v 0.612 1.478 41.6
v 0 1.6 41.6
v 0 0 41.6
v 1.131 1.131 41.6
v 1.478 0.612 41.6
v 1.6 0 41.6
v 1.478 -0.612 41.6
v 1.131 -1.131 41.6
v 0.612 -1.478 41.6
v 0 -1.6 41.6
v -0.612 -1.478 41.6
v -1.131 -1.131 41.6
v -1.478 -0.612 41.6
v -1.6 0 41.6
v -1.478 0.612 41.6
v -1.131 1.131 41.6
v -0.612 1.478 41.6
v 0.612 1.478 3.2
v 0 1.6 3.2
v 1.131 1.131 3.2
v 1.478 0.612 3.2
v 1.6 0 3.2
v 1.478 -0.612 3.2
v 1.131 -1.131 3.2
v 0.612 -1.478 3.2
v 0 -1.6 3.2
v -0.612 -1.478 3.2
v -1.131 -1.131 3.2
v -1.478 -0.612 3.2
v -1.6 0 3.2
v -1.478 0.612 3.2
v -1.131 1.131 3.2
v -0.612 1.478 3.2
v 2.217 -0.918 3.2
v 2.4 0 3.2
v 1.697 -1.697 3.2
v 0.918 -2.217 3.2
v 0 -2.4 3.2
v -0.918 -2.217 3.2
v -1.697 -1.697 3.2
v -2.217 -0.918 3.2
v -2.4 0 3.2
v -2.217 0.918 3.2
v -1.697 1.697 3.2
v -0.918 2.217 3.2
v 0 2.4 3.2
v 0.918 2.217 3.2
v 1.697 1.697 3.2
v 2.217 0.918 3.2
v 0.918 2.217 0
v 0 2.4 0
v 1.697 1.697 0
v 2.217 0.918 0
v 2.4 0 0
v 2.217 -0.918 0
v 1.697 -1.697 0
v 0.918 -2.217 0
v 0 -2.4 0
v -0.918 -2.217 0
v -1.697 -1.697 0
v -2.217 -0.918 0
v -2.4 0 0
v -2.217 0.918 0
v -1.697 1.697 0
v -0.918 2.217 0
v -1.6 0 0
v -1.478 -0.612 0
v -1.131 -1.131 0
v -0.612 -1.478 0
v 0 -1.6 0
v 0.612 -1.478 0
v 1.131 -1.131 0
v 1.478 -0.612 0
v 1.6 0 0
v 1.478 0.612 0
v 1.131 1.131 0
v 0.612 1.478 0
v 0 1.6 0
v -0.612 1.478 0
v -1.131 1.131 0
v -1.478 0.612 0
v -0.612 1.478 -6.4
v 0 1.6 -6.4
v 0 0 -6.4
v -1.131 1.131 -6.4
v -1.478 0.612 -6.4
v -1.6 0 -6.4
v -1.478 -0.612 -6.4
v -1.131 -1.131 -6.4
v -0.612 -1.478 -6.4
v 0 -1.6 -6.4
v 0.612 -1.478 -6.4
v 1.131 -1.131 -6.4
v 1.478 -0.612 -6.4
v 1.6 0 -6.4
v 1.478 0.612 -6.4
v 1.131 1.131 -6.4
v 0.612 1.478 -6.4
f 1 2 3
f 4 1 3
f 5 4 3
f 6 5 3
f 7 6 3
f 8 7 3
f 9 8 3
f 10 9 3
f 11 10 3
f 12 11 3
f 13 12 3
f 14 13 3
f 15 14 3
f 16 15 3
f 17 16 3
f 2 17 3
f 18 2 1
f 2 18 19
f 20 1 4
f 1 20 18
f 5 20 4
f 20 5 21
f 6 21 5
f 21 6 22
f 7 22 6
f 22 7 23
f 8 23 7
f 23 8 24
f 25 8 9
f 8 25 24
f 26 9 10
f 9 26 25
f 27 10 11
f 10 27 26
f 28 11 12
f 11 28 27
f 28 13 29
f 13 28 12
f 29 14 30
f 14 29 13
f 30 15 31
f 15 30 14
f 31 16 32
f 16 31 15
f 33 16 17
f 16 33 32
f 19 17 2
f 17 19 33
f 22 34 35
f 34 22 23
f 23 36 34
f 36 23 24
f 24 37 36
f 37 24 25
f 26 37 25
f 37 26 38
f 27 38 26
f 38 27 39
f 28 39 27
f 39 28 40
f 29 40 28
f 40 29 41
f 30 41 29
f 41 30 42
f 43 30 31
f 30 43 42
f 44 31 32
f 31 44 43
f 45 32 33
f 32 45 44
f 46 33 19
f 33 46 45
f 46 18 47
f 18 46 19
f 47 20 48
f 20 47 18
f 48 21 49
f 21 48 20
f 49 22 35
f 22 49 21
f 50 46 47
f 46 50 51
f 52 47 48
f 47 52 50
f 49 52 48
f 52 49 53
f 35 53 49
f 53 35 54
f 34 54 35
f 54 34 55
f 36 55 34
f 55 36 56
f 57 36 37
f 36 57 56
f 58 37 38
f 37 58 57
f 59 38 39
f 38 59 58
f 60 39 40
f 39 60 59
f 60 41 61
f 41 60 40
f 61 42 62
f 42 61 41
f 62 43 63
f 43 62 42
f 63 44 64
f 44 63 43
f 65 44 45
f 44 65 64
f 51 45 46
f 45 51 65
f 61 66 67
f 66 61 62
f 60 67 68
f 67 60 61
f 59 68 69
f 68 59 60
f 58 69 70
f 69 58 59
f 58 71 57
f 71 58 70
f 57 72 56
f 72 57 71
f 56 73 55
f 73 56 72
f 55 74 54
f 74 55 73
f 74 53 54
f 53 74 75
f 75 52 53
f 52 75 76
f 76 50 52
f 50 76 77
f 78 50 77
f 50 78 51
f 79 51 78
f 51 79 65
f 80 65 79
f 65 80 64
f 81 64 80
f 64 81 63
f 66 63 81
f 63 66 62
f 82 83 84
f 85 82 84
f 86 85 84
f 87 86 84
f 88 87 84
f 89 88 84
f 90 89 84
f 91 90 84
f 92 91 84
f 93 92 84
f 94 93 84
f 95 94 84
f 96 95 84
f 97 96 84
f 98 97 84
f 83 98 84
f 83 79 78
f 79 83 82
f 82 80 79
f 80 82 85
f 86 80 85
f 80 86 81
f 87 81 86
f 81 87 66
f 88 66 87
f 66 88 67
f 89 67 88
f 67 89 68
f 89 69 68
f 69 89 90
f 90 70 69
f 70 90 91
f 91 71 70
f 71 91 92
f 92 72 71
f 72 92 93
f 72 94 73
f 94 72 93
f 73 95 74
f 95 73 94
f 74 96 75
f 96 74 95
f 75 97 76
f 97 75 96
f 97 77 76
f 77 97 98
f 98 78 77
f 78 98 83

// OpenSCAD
// file: ../p/4-4disc.scad
use <../lib.scad>
function ldraw_lib__4_4disc() = [
// 0 Disc 1.0
// 0 Name: 4-4disc.dat
// 0 Author: James Jessiman
// 0 !LDRAW_ORG Primitive UPDATE 2002-02
// 0 !LICENSE Licensed under CC BY 4.0 : see CAreadme.txt
// 
// 0 BFC CERTIFY CCW
  [0,"BFC","CERTIFY"],
  [0,"BFC","CCW"],
// 
// 0 !HISTORY 1998-12-15 [PTadmin] Official Update 1998-10
// 0 !HISTORY 2002-03-23 [sbliss] Added BFC statement
// 0 !HISTORY 2002-04-25 [PTadmin] Official Update 2002-02
// 0 !HISTORY 2007-06-24 [PTadmin] Header formatted for Contributor Agreement
// 0 !HISTORY 2008-07-01 [PTadmin] Official Update 2008-01
// 
// 
// 3 16 0 0 0 1 0 0 0.9239 0 0.3827
  [3,16,0,0,0,1,0,0,0.9239,0,0.3827],
// 3 16 0 0 0 0.9239 0 0.3827 0.7071 0 0.7071
  [3,16,0,0,0,0.9239,0,0.3827,0.7071,0,0.7071],
// 3 16 0 0 0 0.7071 0 0.7071 0.3827 0 0.9239
  [3,16,0,0,0,0.7071,0,0.7071,0.3827,0,0.9239],
// 3 16 0 0 0 0.3827 0 0.9239 0 0 1
  [3,16,0,0,0,0.3827,0,0.9239,0,0,1],
// 3 16 0 0 0 0 0 1 -0.3827 0 0.9239
  [3,16,0,0,0,0,0,1,-0.3827,0,0.9239],
// 3 16 0 0 0 -0.3827 0 0.9239 -0.7071 0 0.7071
  [3,16,0,0,0,-0.3827,0,0.9239,-0.7071,0,0.7071],
// 3 16 0 0 0 -0.7071 0 0.7071 -0.9239 0 0.3827
  [3,16,0,0,0,-0.7071,0,0.7071,-0.9239,0,0.3827],
// 3 16 0 0 0 -0.9239 0 0.3827 -1 0 -0
  [3,16,0,0,0,-0.9239,0,0.3827,-1,0,-0],
// 3 16 0 0 0 -1 0 -0 -0.9239 0 -0.3827
  [3,16,0,0,0,-1,0,-0,-0.9239,0,-0.3827],
// 3 16 0 0 0 -0.9239 0 -0.3827 -0.7071 0 -0.7071
  [3,16,0,0,0,-0.9239,0,-0.3827,-0.7071,0,-0.7071],
// 3 16 0 0 0 -0.7071 0 -0.7071 -0.3827 0 -0.9239
  [3,16,0,0,0,-0.7071,0,-0.7071,-0.3827,0,-0.9239],
// 3 16 0 0 0 -0.3827 0 -0.9239 0 0 -1
  [3,16,0,0,0,-0.3827,0,-0.9239,0,0,-1],
// 3 16 0 0 0 0 0 -1 0.3827 0 -0.9239
  [3,16,0,0,0,0,0,-1,0.3827,0,-0.9239],
// 3 16 0 0 0 0.3827 0 -0.9239 0.7071 0 -0.7071
  [3,16,0,0,0,0.3827,0,-0.9239,0.7071,0,-0.7071],
// 3 16 0 0 0 0.7071 0 -0.7071 0.9239 0 -0.3827
  [3,16,0,0,0,0.7071,0,-0.7071,0.9239,0,-0.3827],
// 3 16 0 0 0 0.9239 0 -0.3827 1 0 0
  [3,16,0,0,0,0.9239,0,-0.3827,1,0,0],
// 0
];
module ldraw_lib__4_4disc(step=0, col=false, unit=2/5, alt=false, line=0.2, solid=!$preview)
    makepoly(ldraw_lib__4_4disc(), step=step, col=col, unit=unit, alt=alt, line=line, solid=solid);
ldraw_lib__4_4disc(line=0.2);
// file: ../p/4-4ring2.scad
use <../lib.scad>
function ldraw_lib__4_4ring2() = [
// 0 Ring  2 x 1.0
// 0 Name: 4-4ring2.dat
// 0 Author: James Jessiman
// 0 !LDRAW_ORG Primitive UPDATE 2009-01
// 0 !LICENSE Licensed under CC BY 4.0 : see CAreadme.txt
// 
// 0 BFC CERTIFY CCW
  [0,"BFC","CERTIFY"],
  [0,"BFC","CCW"],
// 
// 0 !HISTORY 1998-12-15 [PTadmin] Official Update 1998-10
// 0 !HISTORY 2002-04-05 [hafhead] Added BFC statement
// 0 !HISTORY 2002-04-25 [PTadmin] Official Update 2002-02
// 0 !HISTORY 2007-06-24 [PTadmin] Header formatted for Contributor Agreement
// 0 !HISTORY 2008-07-01 [PTadmin] Official Update 2008-01
// 0 !HISTORY 2008-08-26 [cwdee] Switch polygon winding and rename
// 0 !HISTORY 2009-05-02 [PTadmin] Official Update 2009-01
// 
// 
// 4 16 -1.1481 0 2.7717 -0.7654 0 1.8478 0 0 2 0 0 3
  [4,16,-1.1481,0,2.7717,-0.7654,0,1.8478,0,0,2,0,0,3],
// 4 16 -2.1213 0 2.1213 -1.4142 0 1.4142 -0.7654 0 1.8478 -1.1481 0 2.7717
  [4,16,-2.1213,0,2.1213,-1.4142,0,1.4142,-0.7654,0,1.8478,-1.1481,0,2.7717],
// 4 16 -2.7717 0 1.1481 -1.8478 0 0.7654 -1.4142 0 1.4142 -2.1213 0 2.1213
  [4,16,-2.7717,0,1.1481,-1.8478,0,0.7654,-1.4142,0,1.4142,-2.1213,0,2.1213],
// 4 16 -3 0 0 -2 0 0 -1.8478 0 0.7654 -2.7717 0 1.1481
  [4,16,-3,0,0,-2,0,0,-1.8478,0,0.7654,-2.7717,0,1.1481],
// 4 16 -2.7717 0 -1.1481 -1.8478 0 -0.7654 -2 0 0 -3 0 0
  [4,16,-2.7717,0,-1.1481,-1.8478,0,-0.7654,-2,0,0,-3,0,0],
// 4 16 -2.1213 0 -2.1213 -1.4142 0 -1.4142 -1.8478 0 -0.7654 -2.7717 0 -1.1481
  [4,16,-2.1213,0,-2.1213,-1.4142,0,-1.4142,-1.8478,0,-0.7654,-2.7717,0,-1.1481],
// 4 16 -1.1481 0 -2.7717 -0.7654 0 -1.8478 -1.4142 0 -1.4142 -2.1213 0 -2.1213
  [4,16,-1.1481,0,-2.7717,-0.7654,0,-1.8478,-1.4142,0,-1.4142,-2.1213,0,-2.1213],
// 4 16 0 0 -3 0 0 -2 -0.7654 0 -1.8478 -1.1481 0 -2.7717
  [4,16,0,0,-3,0,0,-2,-0.7654,0,-1.8478,-1.1481,0,-2.7717],
// 4 16 1.1481 0 -2.7717 0.7654 0 -1.8478 0 0 -2 0 0 -3
  [4,16,1.1481,0,-2.7717,0.7654,0,-1.8478,0,0,-2,0,0,-3],
// 4 16 2.1213 0 -2.1213 1.4142 0 -1.4142 0.7654 0 -1.8478 1.1481 0 -2.7717
  [4,16,2.1213,0,-2.1213,1.4142,0,-1.4142,0.7654,0,-1.8478,1.1481,0,-2.7717],
// 4 16 2.7717 0 -1.1481 1.8478 0 -0.7654 1.4142 0 -1.4142 2.1213 0 -2.1213
  [4,16,2.7717,0,-1.1481,1.8478,0,-0.7654,1.4142,0,-1.4142,2.1213,0,-2.1213],
// 4 16 3 0 0 2 0 0 1.8478 0 -0.7654 2.7717 0 -1.1481
  [4,16,3,0,0,2,0,0,1.8478,0,-0.7654,2.7717,0,-1.1481],
// 4 16 2.7717 0 1.1481 1.8478 0 0.7654 2 0 0 3 0 0
  [4,16,2.7717,0,1.1481,1.8478,0,0.7654,2,0,0,3,0,0],
// 4 16 2.1213 0 2.1213 1.4142 0 1.4142 1.8478 0 0.7654 2.7717 0 1.1481
  [4,16,2.1213,0,2.1213,1.4142,0,1.4142,1.8478,0,0.7654,2.7717,0,1.1481],
// 4 16 1.1481 0 2.7717 0.7654 0 1.8478 1.4142 0 1.4142 2.1213 0 2.1213
  [4,16,1.1481,0,2.7717,0.7654,0,1.8478,1.4142,0,1.4142,2.1213,0,2.1213],
// 4 16 0 0 3 0 0 2 0.7654 0 1.8478 1.1481 0 2.7717
  [4,16,0,0,3,0,0,2,0.7654,0,1.8478,1.1481,0,2.7717],
// 0
];
module ldraw_lib__4_4ring2(step=0, col=false, unit=2/5, alt=false, line=0.2, solid=!$preview)
    makepoly(ldraw_lib__4_4ring2(), step=step, col=col, unit=unit, alt=alt, line=line, solid=solid);
ldraw_lib__4_4ring2(line=0.2);
// file: ../p/4-4edge.scad
use <../lib.scad>
function ldraw_lib__4_4edge() = [
// 0 Circle 1.0
// 0 Name: 4-4edge.dat
// 0 Author: James Jessiman
// 0 !LDRAW_ORG Primitive UPDATE 2017-01
// 0 !LICENSE Licensed under CC BY 4.0 : see CAreadme.txt
// 
// 0 BFC CERTIFY CCW
  [0,"BFC","CERTIFY"],
  [0,"BFC","CCW"],
// 
// 0 !HISTORY 1998-12-15 [PTadmin] Official Update 1998-10
// 0 !HISTORY 2005-12-28 [PTadmin] Official Update 2005-01
// 0 !HISTORY 2007-06-24 [PTadmin] Header formatted for Contributor Agreement
// 0 !HISTORY 2008-07-01 [PTadmin] Official Update 2008-01
// 0 !HISTORY 2017-01-15 [Steffen] BFCed
// 0 !HISTORY 2017-12-30 [PTadmin] Official Update 2017-01
// 
// 
// 2 24 1 0 0 0.9239 0 0.3827
  [2,24,1,0,0,0.9239,0,0.3827],
// 2 24 0.9239 0 0.3827 0.7071 0 0.7071
  [2,24,0.9239,0,0.3827,0.7071,0,0.7071],
// 2 24 0.7071 0 0.7071 0.3827 0 0.9239
  [2,24,0.7071,0,0.7071,0.3827,0,0.9239],
// 2 24 0.3827 0 0.9239 0 0 1
  [2,24,0.3827,0,0.9239,0,0,1],
// 2 24 0 0 1 -0.3827 0 0.9239
  [2,24,0,0,1,-0.3827,0,0.9239],
// 2 24 -0.3827 0 0.9239 -0.7071 0 0.7071
  [2,24,-0.3827,0,0.9239,-0.7071,0,0.7071],
// 2 24 -0.7071 0 0.7071 -0.9239 0 0.3827
  [2,24,-0.7071,0,0.7071,-0.9239,0,0.3827],
// 2 24 -0.9239 0 0.3827 -1 0 -0
  [2,24,-0.9239,0,0.3827,-1,0,-0],
// 2 24 -1 0 -0 -0.9239 0 -0.3827
  [2,24,-1,0,-0,-0.9239,0,-0.3827],
// 2 24 -0.9239 0 -0.3827 -0.7071 0 -0.7071
  [2,24,-0.9239,0,-0.3827,-0.7071,0,-0.7071],
// 2 24 -0.7071 0 -0.7071 -0.3827 0 -0.9239
  [2,24,-0.7071,0,-0.7071,-0.3827,0,-0.9239],
// 2 24 -0.3827 0 -0.9239 0 0 -1
  [2,24,-0.3827,0,-0.9239,0,0,-1],
// 2 24 0 0 -1 0.3827 0 -0.9239
  [2,24,0,0,-1,0.3827,0,-0.9239],
// 2 24 0.3827 0 -0.9239 0.7071 0 -0.7071
  [2,24,0.3827,0,-0.9239,0.7071,0,-0.7071],
// 2 24 0.7071 0 -0.7071 0.9239 0 -0.3827
  [2,24,0.7071,0,-0.7071,0.9239,0,-0.3827],
// 2 24 0.9239 0 -0.3827 1 0 0
  [2,24,0.9239,0,-0.3827,1,0,0],
];
module ldraw_lib__4_4edge(step=0, col=false, unit=2/5, alt=false, line=0.2, solid=!$preview)
    makepoly(ldraw_lib__4_4edge(), step=step, col=col, unit=unit, alt=alt, line=line, solid=solid);
ldraw_lib__4_4edge(line=0.2);
// file: ../p/4-4cyli.scad
use <../lib.scad>
function ldraw_lib__4_4cyli() = [
// 0 Cylinder 1.0
// 0 Name: 4-4cyli.dat
// 0 Author: James Jessiman
// 0 !LDRAW_ORG Primitive UPDATE 2005-01
// 0 !LICENSE Licensed under CC BY 4.0 : see CAreadme.txt
// 
// 0 BFC CERTIFY CCW
  [0,"BFC","CERTIFY"],
  [0,"BFC","CCW"],
// 
// 0 !HISTORY 1998-12-15 [PTadmin] Official Update 1998-10
// 0 !HISTORY 2002-03-23 [sbliss] Added BFC statement; merged headers from files in distributions LDraw 0.27 and Complete.
// 0 !HISTORY 2002-04-25 [PTadmin] Official Update 2002-02
// 0 !HISTORY 2004-12-14 [guyvivan] BFC CCW
// 0 !HISTORY 2005-12-28 [PTadmin] Official Update 2005-01
// 0 !HISTORY 2007-06-24 [PTadmin] Header formatted for Contributor Agreement
// 0 !HISTORY 2008-07-01 [PTadmin] Official Update 2008-01
// 
// 
// 4 16 1 1 0 0.9239 1 0.3827 0.9239 0 0.3827 1 0 0
  [4,16,1,1,0,0.9239,1,0.3827,0.9239,0,0.3827,1,0,0],
// 5 24 1 0 0 1 1 0 0.9239 0 0.3827 0.9239 0 -0.3827
  [5,24,1,0,0,1,1,0,0.9239,0,0.3827,0.9239,0,-0.3827],
// 4 16 0.9239 1 0.3827 0.7071 1 0.7071 0.7071 0 0.7071 0.9239 0 0.3827
  [4,16,0.9239,1,0.3827,0.7071,1,0.7071,0.7071,0,0.7071,0.9239,0,0.3827],
// 5 24 0.9239 0 0.3827 0.9239 1 0.3827 0.7071 0 0.7071 1 0 0
  [5,24,0.9239,0,0.3827,0.9239,1,0.3827,0.7071,0,0.7071,1,0,0],
// 4 16 0.7071 1 0.7071 0.3827 1 0.9239 0.3827 0 0.9239 0.7071 0 0.7071
  [4,16,0.7071,1,0.7071,0.3827,1,0.9239,0.3827,0,0.9239,0.7071,0,0.7071],
// 5 24 0.7071 0 0.7071 0.7071 1 0.7071 0.3827 0 0.9239 0.9239 0 0.3827
  [5,24,0.7071,0,0.7071,0.7071,1,0.7071,0.3827,0,0.9239,0.9239,0,0.3827],
// 4 16 0.3827 1 0.9239 0 1 1 0 0 1 0.3827 0 0.9239
  [4,16,0.3827,1,0.9239,0,1,1,0,0,1,0.3827,0,0.9239],
// 5 24 0.3827 0 0.9239 0.3827 1 0.9239 0 0 1 0.7071 0 0.7071
  [5,24,0.3827,0,0.9239,0.3827,1,0.9239,0,0,1,0.7071,0,0.7071],
// 4 16 0 1 1 -0.3827 1 0.9239 -0.3827 0 0.9239 0 0 1
  [4,16,0,1,1,-0.3827,1,0.9239,-0.3827,0,0.9239,0,0,1],
// 5 24 0 0 1 0 1 1 -0.3827 0 0.9239 0.3827 0 0.9239
  [5,24,0,0,1,0,1,1,-0.3827,0,0.9239,0.3827,0,0.9239],
// 4 16 -0.3827 1 0.9239 -0.7071 1 0.7071 -0.7071 0 0.7071 -0.3827 0 0.9239
  [4,16,-0.3827,1,0.9239,-0.7071,1,0.7071,-0.7071,0,0.7071,-0.3827,0,0.9239],
// 5 24 -0.3827 0 0.9239 -0.3827 1 0.9239 -0.7071 0 0.7071 0 0 1
  [5,24,-0.3827,0,0.9239,-0.3827,1,0.9239,-0.7071,0,0.7071,0,0,1],
// 4 16 -0.7071 1 0.7071 -0.9239 1 0.3827 -0.9239 0 0.3827 -0.7071 0 0.7071
  [4,16,-0.7071,1,0.7071,-0.9239,1,0.3827,-0.9239,0,0.3827,-0.7071,0,0.7071],
// 5 24 -0.7071 0 0.7071 -0.7071 1 0.7071 -0.9239 0 0.3827 -0.3827 0 0.9239
  [5,24,-0.7071,0,0.7071,-0.7071,1,0.7071,-0.9239,0,0.3827,-0.3827,0,0.9239],
// 4 16 -0.9239 1 0.3827 -1 1 0 -1 0 0 -0.9239 0 0.3827
  [4,16,-0.9239,1,0.3827,-1,1,0,-1,0,0,-0.9239,0,0.3827],
// 5 24 -0.9239 0 0.3827 -0.9239 1 0.3827 -1 0 0 -0.7071 0 0.7071
  [5,24,-0.9239,0,0.3827,-0.9239,1,0.3827,-1,0,0,-0.7071,0,0.7071],
// 4 16 -1 1 0 -0.9239 1 -0.3827 -0.9239 0 -0.3827 -1 0 0
  [4,16,-1,1,0,-0.9239,1,-0.3827,-0.9239,0,-0.3827,-1,0,0],
// 5 24 -1 0 0 -1 1 0 -0.9239 0 -0.3827 -0.9239 0 0.3827
  [5,24,-1,0,0,-1,1,0,-0.9239,0,-0.3827,-0.9239,0,0.3827],
// 4 16 -0.9239 1 -0.3827 -0.7071 1 -0.7071 -0.7071 0 -0.7071 -0.9239 0 -0.3827
  [4,16,-0.9239,1,-0.3827,-0.7071,1,-0.7071,-0.7071,0,-0.7071,-0.9239,0,-0.3827],
// 5 24 -0.9239 0 -0.3827 -0.9239 1 -0.3827 -0.7071 0 -0.7071 -1 0 0
  [5,24,-0.9239,0,-0.3827,-0.9239,1,-0.3827,-0.7071,0,-0.7071,-1,0,0],
// 4 16 -0.7071 1 -0.7071 -0.3827 1 -0.9239 -0.3827 0 -0.9239 -0.7071 0 -0.7071
  [4,16,-0.7071,1,-0.7071,-0.3827,1,-0.9239,-0.3827,0,-0.9239,-0.7071,0,-0.7071],
// 5 24 -0.7071 0 -0.7071 -0.7071 1 -0.7071 -0.3827 0 -0.9239 -0.9239 0 -0.3827
  [5,24,-0.7071,0,-0.7071,-0.7071,1,-0.7071,-0.3827,0,-0.9239,-0.9239,0,-0.3827],
// 4 16 -0.3827 1 -0.9239 0 1 -1 0 0 -1 -0.3827 0 -0.9239
  [4,16,-0.3827,1,-0.9239,0,1,-1,0,0,-1,-0.3827,0,-0.9239],
// 5 24 -0.3827 0 -0.9239 -0.3827 1 -0.9239 0 0 -1 -0.7071 0 -0.7071
  [5,24,-0.3827,0,-0.9239,-0.3827,1,-0.9239,0,0,-1,-0.7071,0,-0.7071],
// 4 16 0 1 -1 0.3827 1 -0.9239 0.3827 0 -0.9239 0 0 -1
  [4,16,0,1,-1,0.3827,1,-0.9239,0.3827,0,-0.9239,0,0,-1],
// 5 24 0 0 -1 0 1 -1 0.3827 0 -0.9239 -0.3827 0 -0.9239
  [5,24,0,0,-1,0,1,-1,0.3827,0,-0.9239,-0.3827,0,-0.9239],
// 4 16 0.3827 1 -0.9239 0.7071 1 -0.7071 0.7071 0 -0.7071 0.3827 0 -0.9239
  [4,16,0.3827,1,-0.9239,0.7071,1,-0.7071,0.7071,0,-0.7071,0.3827,0,-0.9239],
// 5 24 0.3827 0 -0.9239 0.3827 1 -0.9239 0.7071 0 -0.7071 0 0 -1
  [5,24,0.3827,0,-0.9239,0.3827,1,-0.9239,0.7071,0,-0.7071,0,0,-1],
// 4 16 0.7071 1 -0.7071 0.9239 1 -0.3827 0.9239 0 -0.3827 0.7071 0 -0.7071
  [4,16,0.7071,1,-0.7071,0.9239,1,-0.3827,0.9239,0,-0.3827,0.7071,0,-0.7071],
// 5 24 0.7071 0 -0.7071 0.7071 1 -0.7071 0.9239 0 -0.3827 0.3827 0 -0.9239
  [5,24,0.7071,0,-0.7071,0.7071,1,-0.7071,0.9239,0,-0.3827,0.3827,0,-0.9239],
// 4 16 0.9239 1 -0.3827 1 1 0 1 0 0 0.9239 0 -0.3827
  [4,16,0.9239,1,-0.3827,1,1,0,1,0,0,0.9239,0,-0.3827],
// 5 24 0.9239 0 -0.3827 0.9239 1 -0.3827 1 0 0 0.7071 0 -0.7071
  [5,24,0.9239,0,-0.3827,0.9239,1,-0.3827,1,0,0,0.7071,0,-0.7071],
// 0
];
module ldraw_lib__4_4cyli(step=0, col=false, unit=2/5, alt=false, line=0.2, solid=!$preview)
    makepoly(ldraw_lib__4_4cyli(), step=step, col=col, unit=unit, alt=alt, line=line, solid=solid);
ldraw_lib__4_4cyli(line=0.2);
// file: ../p/4-4cylc.scad
use <../lib.scad>
use <4-4cyli.scad>
use <4-4disc.scad>
use <4-4edge.scad>
function ldraw_lib__4_4cylc() = [
// 0 Cylinder Closed 1.0
// 0 Name: 4-4cylc.dat
// 0 Author: Alex Taylor [anathema]
// 0 !LDRAW_ORG Primitive UPDATE 2009-02
// 0 !LICENSE Licensed under CC BY 4.0 : see CAreadme.txt
// 
// 0 BFC CERTIFY CCW
  [0,"BFC","CERTIFY"],
  [0,"BFC","CCW"],
// 
// 0 !HISTORY 2008-12-29 [cwdee] Removed one disc
// 0 !HISTORY 2009-09-03 [PTadmin] Official Update 2009-02
// 
// 
// 1 16 0 0 0 1 0 0 0 1 0 0 0 1 4-4edge.dat
  [1,16,0,0,0,1,0,0,0,1,0,0,0,1, ldraw_lib__4_4edge()],
// 1 16 0 1 0 1 0 0 0 1 0 0 0 1 4-4edge.dat
  [1,16,0,1,0,1,0,0,0,1,0,0,0,1, ldraw_lib__4_4edge()],
// 1 16 0 0 0 1 0 0 0 1 0 0 0 1 4-4disc.dat
  [1,16,0,0,0,1,0,0,0,1,0,0,0,1, ldraw_lib__4_4disc()],
// 1 16 0 0 0 1 0 0 0 1 0 0 0 1 4-4cyli.dat
  [1,16,0,0,0,1,0,0,0,1,0,0,0,1, ldraw_lib__4_4cyli()],
// 0
];
module ldraw_lib__4_4cylc(step=0, col=false, unit=2/5, alt=false, line=0.2, solid=!$preview)
    makepoly(ldraw_lib__4_4cylc(), step=step, col=col, unit=unit, alt=alt, line=line, solid=solid);
ldraw_lib__4_4cylc(line=0.2);
// main file
use <../lib.scad>
use <../p/4-4cylc.scad>
use <../p/4-4cyli.scad>
use <../p/4-4edge.scad>
use <../p/4-4ring2.scad>
function ldraw_lib__63965a() = [
// 0 Bar  6L with Thick Stop
// 0 Name: 63965a.dat
// 0 Author: N. W. Perry [Plastikean]
// 0 !LDRAW_ORG Part UPDATE 2025-09
// 0 !LICENSE Licensed under CC BY 4.0 : see CAreadme.txt
// 
// 0 BFC CERTIFY CCW
  [0,"BFC","CERTIFY"],
  [0,"BFC","CCW"],
// 
// 0 !KEYWORDS BrickLink 63965, Missile, pole, Rebrickable 63965, rod, Small, stand
// 0 !KEYWORDS Star Wars, town, umbrella
// 
// 0 !HISTORY 2020-04-16 [Plastikean] Adjusted part length, pos & width of ring
// 0 !HISTORY 2020-06-28 [PTadmin] Official Update 2020-01
// 0 !HISTORY 2025-09-27 [OrionP] Changed winding to CCW
// 0 !HISTORY 2025-09-29 [OrionP] Official Update 2025-09
// 
// 1 16 0 -104 0 0 0 4 0 96 0 4 0 0 4-4cylc.dat
  [1,16,0,-104,0,0,0,4,0,96,0,4,0,0, ldraw_lib__4_4cylc()],
// 1 16 0 -8 0 0 0 6 0 1 0 6 0 0 4-4edge.dat
  [1,16,0,-8,0,0,0,6,0,1,0,6,0,0, ldraw_lib__4_4edge()],
// 1 16 0 -8 0 0 0 2 0 2 0 2 0 0 4-4ring2.dat
  [1,16,0,-8,0,0,0,2,0,2,0,2,0,0, ldraw_lib__4_4ring2()],
// 1 16 0 -8 0 0 0 6 0 8 0 6 0 0 4-4cyli.dat
  [1,16,0,-8,0,0,0,6,0,8,0,6,0,0, ldraw_lib__4_4cyli()],
// 1 16 0 0 0 0 0 6 0 1 0 6 0 0 4-4edge.dat
  [1,16,0,0,0,0,0,6,0,1,0,6,0,0, ldraw_lib__4_4edge()],
// 1 16 0 0 0 0 0 -2 0 -2 0 2 0 0 4-4ring2.dat
  [1,16,0,0,0,0,0,-2,0,-2,0,2,0,0, ldraw_lib__4_4ring2()],
// 1 16 0 16 0 0 0 -4 0 -16 0 4 0 0 4-4cylc.dat
  [1,16,0,16,0,0,0,-4,0,-16,0,4,0,0, ldraw_lib__4_4cylc()],
];
module ldraw_lib__63965a(step=0, col=false, unit=2/5, alt=false, line=0.2, solid=!$preview)
    makepoly(ldraw_lib__63965a(), step=step, col=col, unit=unit, alt=alt, line=line, solid=solid);
ldraw_lib__63965a(line=0.2);
